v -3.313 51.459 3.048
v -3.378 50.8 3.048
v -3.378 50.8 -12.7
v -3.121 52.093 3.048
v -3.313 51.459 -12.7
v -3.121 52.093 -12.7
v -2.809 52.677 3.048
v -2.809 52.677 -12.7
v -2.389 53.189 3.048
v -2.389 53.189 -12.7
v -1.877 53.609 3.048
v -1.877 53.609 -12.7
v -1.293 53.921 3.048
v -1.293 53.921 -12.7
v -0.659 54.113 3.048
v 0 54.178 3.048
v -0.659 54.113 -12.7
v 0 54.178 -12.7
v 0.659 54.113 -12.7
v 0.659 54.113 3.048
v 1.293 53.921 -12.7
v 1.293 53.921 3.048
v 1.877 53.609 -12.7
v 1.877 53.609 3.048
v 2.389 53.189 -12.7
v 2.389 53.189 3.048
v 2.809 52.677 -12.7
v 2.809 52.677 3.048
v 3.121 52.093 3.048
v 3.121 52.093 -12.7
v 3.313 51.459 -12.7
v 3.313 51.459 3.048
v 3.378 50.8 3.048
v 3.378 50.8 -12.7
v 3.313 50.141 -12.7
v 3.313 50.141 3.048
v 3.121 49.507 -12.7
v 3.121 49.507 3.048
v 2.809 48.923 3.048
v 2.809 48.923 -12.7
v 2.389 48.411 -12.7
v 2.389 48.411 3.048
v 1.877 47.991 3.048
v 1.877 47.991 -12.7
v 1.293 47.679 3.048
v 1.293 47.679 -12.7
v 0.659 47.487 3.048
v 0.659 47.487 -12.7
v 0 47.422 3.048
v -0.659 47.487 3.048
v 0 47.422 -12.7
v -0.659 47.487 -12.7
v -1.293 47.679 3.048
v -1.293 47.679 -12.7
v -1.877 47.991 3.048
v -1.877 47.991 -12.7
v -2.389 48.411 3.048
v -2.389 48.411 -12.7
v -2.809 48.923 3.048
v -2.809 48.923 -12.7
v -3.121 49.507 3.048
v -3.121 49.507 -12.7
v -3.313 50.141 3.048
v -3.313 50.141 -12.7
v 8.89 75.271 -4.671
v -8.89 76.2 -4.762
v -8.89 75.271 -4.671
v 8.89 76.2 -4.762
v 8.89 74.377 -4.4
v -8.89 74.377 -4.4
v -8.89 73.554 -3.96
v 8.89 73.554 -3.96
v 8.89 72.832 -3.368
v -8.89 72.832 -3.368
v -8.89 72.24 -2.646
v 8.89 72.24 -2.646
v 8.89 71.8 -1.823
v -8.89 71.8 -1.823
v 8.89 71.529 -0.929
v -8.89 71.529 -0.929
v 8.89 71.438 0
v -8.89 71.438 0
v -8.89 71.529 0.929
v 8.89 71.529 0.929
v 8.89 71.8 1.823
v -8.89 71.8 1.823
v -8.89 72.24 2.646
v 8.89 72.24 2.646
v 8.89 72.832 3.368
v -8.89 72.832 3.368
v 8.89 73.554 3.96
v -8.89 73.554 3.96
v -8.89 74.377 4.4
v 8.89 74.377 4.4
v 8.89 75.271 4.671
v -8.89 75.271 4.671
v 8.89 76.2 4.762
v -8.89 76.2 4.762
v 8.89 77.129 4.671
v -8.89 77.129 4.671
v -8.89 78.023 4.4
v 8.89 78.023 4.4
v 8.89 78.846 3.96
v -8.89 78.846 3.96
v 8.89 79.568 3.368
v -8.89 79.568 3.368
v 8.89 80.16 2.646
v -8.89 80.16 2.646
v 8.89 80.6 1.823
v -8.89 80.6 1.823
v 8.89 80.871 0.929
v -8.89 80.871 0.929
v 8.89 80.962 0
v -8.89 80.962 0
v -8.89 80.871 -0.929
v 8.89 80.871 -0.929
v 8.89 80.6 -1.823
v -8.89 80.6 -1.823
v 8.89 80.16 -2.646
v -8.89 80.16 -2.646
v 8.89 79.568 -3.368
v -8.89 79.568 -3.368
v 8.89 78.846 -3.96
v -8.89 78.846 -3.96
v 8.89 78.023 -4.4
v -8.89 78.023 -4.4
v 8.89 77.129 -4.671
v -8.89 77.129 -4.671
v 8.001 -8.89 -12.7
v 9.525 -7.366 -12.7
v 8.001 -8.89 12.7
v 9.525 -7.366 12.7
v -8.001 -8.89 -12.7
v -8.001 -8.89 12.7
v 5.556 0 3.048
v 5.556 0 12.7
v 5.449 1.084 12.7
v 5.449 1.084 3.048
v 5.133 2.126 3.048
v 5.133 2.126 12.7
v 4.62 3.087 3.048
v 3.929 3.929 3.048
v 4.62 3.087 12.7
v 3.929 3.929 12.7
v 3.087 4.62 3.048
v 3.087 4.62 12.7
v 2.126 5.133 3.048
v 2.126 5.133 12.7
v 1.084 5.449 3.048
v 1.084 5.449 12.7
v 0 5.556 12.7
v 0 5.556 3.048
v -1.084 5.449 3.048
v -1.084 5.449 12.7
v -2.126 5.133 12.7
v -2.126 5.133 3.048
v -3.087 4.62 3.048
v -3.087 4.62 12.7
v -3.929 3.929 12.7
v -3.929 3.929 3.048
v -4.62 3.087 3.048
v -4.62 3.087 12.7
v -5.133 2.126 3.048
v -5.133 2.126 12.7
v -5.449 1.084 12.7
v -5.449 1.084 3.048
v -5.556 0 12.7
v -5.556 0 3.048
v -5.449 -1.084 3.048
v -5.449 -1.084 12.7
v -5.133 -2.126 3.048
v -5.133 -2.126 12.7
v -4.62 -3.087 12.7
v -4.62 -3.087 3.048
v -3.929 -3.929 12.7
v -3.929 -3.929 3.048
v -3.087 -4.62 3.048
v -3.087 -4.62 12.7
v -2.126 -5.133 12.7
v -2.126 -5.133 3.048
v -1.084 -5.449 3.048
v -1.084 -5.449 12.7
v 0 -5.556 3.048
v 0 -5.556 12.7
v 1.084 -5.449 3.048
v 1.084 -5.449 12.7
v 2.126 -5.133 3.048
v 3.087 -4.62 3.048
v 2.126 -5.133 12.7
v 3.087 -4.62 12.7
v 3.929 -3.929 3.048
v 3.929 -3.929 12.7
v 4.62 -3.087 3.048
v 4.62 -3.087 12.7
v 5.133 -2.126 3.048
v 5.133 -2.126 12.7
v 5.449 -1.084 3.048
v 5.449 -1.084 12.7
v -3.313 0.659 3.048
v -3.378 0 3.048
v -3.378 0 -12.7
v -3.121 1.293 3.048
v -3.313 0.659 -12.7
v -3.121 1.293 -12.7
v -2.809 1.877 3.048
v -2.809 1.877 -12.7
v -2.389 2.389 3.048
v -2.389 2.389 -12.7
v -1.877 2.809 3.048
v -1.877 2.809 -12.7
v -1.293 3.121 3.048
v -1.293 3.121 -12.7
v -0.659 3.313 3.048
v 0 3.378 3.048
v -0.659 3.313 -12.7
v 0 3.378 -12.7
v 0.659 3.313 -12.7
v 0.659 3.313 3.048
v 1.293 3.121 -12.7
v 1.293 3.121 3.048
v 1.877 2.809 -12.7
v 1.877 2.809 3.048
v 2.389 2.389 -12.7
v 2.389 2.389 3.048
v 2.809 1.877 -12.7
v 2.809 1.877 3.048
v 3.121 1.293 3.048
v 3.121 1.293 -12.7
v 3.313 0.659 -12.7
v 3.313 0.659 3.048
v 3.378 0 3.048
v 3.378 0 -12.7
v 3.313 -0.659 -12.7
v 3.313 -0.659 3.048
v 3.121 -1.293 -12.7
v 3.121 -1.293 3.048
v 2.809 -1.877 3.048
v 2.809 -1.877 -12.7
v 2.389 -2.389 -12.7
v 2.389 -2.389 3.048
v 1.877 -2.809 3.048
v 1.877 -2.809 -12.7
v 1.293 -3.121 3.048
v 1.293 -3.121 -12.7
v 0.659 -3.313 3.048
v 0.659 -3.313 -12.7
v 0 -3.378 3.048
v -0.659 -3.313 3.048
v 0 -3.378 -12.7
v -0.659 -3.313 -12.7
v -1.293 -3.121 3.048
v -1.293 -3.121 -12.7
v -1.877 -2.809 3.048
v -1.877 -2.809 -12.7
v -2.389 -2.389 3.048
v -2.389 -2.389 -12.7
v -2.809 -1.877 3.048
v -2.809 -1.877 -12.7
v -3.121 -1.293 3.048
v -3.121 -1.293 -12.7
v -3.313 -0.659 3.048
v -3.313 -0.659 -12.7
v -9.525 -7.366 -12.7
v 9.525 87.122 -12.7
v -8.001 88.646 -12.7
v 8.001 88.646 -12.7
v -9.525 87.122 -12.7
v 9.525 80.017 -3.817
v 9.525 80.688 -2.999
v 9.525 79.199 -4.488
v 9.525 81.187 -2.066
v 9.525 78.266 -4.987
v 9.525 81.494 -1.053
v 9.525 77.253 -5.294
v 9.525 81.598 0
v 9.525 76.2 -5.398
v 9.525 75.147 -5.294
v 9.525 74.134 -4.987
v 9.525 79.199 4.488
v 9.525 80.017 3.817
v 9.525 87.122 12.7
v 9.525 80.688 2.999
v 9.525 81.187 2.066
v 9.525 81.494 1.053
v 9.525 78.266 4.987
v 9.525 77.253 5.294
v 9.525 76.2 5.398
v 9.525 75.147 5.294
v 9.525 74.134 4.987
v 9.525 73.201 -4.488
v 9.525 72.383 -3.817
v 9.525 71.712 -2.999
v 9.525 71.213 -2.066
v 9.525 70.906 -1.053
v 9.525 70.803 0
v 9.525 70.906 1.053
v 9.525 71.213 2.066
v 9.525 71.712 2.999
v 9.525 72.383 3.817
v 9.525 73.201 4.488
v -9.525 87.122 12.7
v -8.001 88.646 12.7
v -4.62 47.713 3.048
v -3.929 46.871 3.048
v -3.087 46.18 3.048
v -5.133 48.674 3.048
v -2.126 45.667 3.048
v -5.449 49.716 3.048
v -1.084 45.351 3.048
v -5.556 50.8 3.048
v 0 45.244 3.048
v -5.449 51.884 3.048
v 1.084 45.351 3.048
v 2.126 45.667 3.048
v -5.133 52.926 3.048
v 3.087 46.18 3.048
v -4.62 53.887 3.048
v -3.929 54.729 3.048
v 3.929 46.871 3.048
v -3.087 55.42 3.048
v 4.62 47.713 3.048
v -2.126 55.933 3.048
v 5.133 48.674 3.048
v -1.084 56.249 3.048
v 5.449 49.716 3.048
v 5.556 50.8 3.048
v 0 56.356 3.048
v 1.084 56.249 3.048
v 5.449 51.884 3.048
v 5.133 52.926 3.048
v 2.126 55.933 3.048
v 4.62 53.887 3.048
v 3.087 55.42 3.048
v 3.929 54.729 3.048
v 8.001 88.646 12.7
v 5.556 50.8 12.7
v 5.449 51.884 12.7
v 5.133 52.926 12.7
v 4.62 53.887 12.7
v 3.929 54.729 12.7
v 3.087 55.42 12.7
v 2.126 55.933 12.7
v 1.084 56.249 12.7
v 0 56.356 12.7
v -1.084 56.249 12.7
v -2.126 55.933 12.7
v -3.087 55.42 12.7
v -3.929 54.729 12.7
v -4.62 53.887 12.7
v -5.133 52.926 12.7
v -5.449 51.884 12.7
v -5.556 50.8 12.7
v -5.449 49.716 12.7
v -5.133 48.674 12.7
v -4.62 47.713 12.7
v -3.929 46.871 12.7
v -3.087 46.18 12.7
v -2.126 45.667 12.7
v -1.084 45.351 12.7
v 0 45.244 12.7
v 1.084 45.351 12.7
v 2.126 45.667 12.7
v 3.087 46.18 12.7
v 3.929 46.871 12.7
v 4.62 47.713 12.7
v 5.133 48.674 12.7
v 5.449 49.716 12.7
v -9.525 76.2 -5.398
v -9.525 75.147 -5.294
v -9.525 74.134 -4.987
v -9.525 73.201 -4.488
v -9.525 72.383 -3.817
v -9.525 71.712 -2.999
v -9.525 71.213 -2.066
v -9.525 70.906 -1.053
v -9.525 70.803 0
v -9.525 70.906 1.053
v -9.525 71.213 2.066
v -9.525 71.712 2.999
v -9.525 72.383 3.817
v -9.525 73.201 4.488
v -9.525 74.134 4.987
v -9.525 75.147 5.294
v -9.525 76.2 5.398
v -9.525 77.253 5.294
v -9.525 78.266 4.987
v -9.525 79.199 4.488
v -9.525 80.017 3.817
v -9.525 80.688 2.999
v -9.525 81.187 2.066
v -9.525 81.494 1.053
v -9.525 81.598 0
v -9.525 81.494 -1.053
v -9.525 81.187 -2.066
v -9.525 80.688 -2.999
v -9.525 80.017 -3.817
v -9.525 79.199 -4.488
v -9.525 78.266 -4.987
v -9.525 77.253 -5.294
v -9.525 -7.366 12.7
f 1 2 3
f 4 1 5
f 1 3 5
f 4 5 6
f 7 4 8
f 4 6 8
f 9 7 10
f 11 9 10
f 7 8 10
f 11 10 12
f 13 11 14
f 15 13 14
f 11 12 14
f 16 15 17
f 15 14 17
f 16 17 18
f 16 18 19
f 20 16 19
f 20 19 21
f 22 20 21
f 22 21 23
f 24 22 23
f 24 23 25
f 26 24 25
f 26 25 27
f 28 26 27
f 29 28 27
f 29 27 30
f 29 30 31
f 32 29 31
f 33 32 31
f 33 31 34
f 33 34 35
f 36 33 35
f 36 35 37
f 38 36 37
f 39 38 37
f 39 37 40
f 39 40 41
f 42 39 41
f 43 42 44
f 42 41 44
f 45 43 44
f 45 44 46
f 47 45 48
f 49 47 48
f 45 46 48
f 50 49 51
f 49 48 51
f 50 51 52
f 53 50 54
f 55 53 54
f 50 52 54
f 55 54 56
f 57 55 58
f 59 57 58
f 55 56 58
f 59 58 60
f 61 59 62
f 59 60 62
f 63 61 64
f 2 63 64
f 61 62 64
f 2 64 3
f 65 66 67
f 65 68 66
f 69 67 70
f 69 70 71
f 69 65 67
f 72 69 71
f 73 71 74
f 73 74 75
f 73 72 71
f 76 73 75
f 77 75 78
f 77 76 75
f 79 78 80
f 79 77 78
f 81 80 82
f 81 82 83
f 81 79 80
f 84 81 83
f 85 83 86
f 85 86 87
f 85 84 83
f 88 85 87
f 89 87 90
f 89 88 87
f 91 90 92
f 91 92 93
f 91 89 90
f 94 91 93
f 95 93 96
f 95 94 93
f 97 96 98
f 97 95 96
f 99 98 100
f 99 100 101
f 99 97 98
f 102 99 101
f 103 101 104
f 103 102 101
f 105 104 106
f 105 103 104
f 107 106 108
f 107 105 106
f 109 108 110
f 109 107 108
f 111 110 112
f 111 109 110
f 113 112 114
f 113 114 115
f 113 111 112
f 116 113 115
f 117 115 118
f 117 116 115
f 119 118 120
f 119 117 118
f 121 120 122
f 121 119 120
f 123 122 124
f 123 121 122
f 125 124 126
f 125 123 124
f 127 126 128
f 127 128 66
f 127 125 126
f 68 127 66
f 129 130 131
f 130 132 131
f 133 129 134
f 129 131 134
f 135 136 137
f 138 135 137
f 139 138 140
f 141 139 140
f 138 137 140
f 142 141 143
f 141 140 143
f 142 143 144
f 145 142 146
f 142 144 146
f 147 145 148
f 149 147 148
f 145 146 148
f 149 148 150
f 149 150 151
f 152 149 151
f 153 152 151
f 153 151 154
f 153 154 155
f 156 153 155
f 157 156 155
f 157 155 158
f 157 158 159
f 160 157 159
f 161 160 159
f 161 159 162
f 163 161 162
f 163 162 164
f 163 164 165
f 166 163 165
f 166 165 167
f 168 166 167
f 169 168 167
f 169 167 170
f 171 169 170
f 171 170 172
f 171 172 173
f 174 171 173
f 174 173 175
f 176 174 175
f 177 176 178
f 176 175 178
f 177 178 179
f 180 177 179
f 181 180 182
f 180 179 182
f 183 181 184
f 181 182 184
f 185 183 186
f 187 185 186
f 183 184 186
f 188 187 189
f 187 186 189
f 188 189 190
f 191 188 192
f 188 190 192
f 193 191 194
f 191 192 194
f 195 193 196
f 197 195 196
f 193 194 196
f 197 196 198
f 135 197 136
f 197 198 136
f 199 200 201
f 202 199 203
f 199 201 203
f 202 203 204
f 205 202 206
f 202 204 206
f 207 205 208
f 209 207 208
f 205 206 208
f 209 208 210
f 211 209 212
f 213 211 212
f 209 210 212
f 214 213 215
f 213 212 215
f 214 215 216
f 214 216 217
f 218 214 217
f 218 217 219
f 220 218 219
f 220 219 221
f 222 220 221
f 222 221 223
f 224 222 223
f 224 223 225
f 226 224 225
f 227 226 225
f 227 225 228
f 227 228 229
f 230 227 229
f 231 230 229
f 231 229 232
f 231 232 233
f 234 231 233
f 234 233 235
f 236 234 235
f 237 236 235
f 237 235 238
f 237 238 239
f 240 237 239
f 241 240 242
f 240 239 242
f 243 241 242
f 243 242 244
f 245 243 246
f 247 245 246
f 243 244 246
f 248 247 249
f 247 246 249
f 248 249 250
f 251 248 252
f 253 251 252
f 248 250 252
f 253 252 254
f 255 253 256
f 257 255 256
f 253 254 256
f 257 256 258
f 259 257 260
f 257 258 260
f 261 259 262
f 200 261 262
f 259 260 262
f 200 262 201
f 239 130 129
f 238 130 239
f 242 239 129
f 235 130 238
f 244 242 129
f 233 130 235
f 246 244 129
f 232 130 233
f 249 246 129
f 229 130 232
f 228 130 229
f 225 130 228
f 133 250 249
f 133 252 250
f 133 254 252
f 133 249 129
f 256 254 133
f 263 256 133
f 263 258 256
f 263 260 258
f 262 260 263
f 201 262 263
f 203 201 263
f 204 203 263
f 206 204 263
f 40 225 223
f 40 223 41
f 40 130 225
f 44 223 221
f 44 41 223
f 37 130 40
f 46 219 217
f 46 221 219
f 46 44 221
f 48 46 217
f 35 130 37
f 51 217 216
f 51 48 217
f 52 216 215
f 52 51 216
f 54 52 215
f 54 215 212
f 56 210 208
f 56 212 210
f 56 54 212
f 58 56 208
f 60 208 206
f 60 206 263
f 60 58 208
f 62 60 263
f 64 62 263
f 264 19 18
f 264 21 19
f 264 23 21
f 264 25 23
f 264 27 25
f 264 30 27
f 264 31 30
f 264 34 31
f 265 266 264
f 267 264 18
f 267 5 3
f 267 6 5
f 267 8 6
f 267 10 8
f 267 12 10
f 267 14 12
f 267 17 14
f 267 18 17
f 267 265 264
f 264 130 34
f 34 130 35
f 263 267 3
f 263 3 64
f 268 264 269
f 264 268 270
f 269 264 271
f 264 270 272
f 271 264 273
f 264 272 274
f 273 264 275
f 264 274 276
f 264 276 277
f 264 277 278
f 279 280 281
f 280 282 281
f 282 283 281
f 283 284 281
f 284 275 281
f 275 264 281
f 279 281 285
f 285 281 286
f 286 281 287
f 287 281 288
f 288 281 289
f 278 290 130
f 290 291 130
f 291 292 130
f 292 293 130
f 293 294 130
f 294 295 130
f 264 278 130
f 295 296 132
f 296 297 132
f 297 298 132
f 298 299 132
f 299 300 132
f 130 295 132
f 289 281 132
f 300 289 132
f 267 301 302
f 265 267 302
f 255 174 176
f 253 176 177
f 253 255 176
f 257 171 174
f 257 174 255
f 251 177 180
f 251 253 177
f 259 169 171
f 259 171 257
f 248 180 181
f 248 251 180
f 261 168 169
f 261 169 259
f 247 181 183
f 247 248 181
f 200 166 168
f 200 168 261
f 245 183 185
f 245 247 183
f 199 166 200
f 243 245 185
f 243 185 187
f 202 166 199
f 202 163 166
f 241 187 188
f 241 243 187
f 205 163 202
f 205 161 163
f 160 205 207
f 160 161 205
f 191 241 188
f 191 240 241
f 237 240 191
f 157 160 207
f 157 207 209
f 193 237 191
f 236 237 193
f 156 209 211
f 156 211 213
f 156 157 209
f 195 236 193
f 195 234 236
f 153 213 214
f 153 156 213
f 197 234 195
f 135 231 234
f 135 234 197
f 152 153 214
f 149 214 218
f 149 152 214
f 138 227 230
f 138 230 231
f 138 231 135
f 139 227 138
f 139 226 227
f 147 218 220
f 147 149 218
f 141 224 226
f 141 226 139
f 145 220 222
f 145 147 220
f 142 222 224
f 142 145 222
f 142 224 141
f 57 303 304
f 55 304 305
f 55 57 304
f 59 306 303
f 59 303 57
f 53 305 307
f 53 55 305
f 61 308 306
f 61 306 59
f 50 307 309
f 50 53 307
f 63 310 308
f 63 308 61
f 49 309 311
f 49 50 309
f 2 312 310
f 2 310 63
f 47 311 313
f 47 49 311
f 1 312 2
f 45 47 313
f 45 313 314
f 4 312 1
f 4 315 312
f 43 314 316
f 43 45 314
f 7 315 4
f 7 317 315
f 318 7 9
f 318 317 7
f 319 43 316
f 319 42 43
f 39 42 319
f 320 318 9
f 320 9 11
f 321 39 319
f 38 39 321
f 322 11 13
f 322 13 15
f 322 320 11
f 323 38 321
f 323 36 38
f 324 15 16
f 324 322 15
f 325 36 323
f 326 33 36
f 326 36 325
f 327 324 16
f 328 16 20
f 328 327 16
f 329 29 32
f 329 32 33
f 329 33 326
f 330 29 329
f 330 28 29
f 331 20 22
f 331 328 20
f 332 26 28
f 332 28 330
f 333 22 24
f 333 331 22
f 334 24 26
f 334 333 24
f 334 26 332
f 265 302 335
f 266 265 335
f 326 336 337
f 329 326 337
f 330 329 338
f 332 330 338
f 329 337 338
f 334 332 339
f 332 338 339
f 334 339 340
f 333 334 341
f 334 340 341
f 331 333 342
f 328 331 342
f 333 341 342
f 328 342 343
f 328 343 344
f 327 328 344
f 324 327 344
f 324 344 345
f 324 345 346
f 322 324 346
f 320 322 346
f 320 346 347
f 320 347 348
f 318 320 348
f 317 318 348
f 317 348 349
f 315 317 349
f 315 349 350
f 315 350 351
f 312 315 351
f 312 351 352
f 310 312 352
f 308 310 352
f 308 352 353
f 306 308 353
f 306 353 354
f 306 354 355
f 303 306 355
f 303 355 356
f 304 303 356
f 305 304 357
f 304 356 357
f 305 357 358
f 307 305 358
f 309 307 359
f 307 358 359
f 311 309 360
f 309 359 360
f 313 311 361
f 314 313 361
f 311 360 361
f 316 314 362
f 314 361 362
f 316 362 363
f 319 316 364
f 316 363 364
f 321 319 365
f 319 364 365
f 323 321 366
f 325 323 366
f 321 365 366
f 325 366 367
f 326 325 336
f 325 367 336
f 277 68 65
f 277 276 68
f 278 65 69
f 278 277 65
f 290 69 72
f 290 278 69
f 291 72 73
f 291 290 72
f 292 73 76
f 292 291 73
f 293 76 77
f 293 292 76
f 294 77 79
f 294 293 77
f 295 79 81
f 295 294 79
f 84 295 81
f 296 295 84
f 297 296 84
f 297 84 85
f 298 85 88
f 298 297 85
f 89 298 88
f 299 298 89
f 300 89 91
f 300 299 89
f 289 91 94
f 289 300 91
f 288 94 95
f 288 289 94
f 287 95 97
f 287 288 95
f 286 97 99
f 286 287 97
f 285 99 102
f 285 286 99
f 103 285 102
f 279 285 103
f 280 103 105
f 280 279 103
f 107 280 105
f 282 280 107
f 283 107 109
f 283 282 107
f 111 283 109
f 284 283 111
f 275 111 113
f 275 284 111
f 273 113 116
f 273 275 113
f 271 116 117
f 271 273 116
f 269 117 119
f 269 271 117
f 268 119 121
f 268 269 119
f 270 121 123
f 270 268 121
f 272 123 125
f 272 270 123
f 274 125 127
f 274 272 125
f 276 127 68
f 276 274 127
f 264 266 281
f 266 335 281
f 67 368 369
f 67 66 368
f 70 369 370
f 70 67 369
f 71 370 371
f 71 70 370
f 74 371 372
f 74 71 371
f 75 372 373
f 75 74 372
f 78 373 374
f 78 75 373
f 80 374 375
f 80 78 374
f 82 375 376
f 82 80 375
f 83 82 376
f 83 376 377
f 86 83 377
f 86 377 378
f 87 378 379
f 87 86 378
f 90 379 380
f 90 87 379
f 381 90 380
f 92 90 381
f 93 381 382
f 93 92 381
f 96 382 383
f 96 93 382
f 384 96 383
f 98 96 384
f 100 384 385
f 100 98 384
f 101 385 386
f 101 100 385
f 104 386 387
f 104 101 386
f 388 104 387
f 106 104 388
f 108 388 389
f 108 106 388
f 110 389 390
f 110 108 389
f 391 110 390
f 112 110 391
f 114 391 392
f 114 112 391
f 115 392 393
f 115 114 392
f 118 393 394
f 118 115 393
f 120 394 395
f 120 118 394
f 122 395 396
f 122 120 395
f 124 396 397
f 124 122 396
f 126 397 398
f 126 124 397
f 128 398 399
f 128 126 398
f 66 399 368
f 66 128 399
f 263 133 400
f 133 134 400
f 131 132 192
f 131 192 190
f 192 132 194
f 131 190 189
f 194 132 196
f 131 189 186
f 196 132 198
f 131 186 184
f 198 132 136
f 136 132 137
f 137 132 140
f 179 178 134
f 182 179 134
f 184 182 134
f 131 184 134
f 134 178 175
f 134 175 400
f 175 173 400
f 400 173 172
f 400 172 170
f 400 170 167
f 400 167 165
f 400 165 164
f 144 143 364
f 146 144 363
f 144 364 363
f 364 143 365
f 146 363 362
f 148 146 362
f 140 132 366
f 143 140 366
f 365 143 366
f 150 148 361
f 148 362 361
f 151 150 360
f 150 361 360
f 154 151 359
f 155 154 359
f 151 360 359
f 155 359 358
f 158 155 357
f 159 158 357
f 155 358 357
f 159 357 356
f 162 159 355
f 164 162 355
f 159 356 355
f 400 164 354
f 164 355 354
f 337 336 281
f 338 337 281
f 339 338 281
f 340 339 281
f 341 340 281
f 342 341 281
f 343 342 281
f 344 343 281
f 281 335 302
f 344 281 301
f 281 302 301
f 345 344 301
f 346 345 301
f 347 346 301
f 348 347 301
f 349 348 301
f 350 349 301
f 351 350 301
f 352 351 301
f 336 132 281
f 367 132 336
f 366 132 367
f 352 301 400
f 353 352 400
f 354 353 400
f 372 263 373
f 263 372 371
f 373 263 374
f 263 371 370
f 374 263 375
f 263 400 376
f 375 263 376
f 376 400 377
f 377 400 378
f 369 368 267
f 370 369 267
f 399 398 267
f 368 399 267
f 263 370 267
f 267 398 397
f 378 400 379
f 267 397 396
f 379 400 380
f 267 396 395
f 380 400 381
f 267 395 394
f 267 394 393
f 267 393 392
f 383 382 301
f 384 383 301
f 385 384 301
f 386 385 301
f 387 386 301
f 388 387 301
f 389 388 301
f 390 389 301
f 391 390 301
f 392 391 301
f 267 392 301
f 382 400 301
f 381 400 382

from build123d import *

# Parameters (mm, degrees)
BOSS_EXTRUDE1_DEPTH                              = 12.7
CBORE_FOR_1_4_SOCKET_HEAD_CAP_SCREW1_D           = 6.7564
CBORE_FOR_1_4_SOCKET_HEAD_CAP_SCREW1_DEPTH       = 25.4
CBORE_FOR_1_4_SOCKET_HEAD_CAP_SCREW1_CBORE_D     = 11.1125
CBORE_FOR_1_4_SOCKET_HEAD_CAP_SCREW1_CBORE_DEPTH = 9.652


with BuildPart() as part:
    # Sketch6 → Boss-Extrude1 (new body, symmetric)
    with BuildSketch(Plane.XY):
        Polygon((-8.001, 88.646), (8.001, 88.646), (9.525, 87.122), (9.525, -7.366), (8.001, -8.89), (-8.001, -8.89), (-9.525, -7.366), (-9.525, 87.122), align=None)
    extrude(amount=BOSS_EXTRUDE1_DEPTH, both=True)

    # Sketch11 → 3/8-16 Tapped Hole1 (revolve, cut)
    with BuildSketch(Plane(origin=(9.525, 76.2, 0), x_dir=(0, 0, -1), z_dir=(0, 1, 0))):
        Polygon((0, 0), (0, 19.05), (5.3975, 19.05), (4.7625, 18.415), (4.7625, 0.635), (5.3975, 0), align=None)
    revolve(axis=Axis((15.875, 76.2, 0), (-1, 0, 0)), mode=Mode.SUBTRACT)

    # CBORE for 1/4 Socket Head Cap Screw1
    with Locations(Plane.XY.offset(12.7)):
        with Locations((0, 0), (0, 50.8)):
            CounterBoreHole(CBORE_FOR_1_4_SOCKET_HEAD_CAP_SCREW1_D / 2, CBORE_FOR_1_4_SOCKET_HEAD_CAP_SCREW1_CBORE_D / 2, CBORE_FOR_1_4_SOCKET_HEAD_CAP_SCREW1_CBORE_DEPTH, depth=CBORE_FOR_1_4_SOCKET_HEAD_CAP_SCREW1_DEPTH)


solid = part.part
